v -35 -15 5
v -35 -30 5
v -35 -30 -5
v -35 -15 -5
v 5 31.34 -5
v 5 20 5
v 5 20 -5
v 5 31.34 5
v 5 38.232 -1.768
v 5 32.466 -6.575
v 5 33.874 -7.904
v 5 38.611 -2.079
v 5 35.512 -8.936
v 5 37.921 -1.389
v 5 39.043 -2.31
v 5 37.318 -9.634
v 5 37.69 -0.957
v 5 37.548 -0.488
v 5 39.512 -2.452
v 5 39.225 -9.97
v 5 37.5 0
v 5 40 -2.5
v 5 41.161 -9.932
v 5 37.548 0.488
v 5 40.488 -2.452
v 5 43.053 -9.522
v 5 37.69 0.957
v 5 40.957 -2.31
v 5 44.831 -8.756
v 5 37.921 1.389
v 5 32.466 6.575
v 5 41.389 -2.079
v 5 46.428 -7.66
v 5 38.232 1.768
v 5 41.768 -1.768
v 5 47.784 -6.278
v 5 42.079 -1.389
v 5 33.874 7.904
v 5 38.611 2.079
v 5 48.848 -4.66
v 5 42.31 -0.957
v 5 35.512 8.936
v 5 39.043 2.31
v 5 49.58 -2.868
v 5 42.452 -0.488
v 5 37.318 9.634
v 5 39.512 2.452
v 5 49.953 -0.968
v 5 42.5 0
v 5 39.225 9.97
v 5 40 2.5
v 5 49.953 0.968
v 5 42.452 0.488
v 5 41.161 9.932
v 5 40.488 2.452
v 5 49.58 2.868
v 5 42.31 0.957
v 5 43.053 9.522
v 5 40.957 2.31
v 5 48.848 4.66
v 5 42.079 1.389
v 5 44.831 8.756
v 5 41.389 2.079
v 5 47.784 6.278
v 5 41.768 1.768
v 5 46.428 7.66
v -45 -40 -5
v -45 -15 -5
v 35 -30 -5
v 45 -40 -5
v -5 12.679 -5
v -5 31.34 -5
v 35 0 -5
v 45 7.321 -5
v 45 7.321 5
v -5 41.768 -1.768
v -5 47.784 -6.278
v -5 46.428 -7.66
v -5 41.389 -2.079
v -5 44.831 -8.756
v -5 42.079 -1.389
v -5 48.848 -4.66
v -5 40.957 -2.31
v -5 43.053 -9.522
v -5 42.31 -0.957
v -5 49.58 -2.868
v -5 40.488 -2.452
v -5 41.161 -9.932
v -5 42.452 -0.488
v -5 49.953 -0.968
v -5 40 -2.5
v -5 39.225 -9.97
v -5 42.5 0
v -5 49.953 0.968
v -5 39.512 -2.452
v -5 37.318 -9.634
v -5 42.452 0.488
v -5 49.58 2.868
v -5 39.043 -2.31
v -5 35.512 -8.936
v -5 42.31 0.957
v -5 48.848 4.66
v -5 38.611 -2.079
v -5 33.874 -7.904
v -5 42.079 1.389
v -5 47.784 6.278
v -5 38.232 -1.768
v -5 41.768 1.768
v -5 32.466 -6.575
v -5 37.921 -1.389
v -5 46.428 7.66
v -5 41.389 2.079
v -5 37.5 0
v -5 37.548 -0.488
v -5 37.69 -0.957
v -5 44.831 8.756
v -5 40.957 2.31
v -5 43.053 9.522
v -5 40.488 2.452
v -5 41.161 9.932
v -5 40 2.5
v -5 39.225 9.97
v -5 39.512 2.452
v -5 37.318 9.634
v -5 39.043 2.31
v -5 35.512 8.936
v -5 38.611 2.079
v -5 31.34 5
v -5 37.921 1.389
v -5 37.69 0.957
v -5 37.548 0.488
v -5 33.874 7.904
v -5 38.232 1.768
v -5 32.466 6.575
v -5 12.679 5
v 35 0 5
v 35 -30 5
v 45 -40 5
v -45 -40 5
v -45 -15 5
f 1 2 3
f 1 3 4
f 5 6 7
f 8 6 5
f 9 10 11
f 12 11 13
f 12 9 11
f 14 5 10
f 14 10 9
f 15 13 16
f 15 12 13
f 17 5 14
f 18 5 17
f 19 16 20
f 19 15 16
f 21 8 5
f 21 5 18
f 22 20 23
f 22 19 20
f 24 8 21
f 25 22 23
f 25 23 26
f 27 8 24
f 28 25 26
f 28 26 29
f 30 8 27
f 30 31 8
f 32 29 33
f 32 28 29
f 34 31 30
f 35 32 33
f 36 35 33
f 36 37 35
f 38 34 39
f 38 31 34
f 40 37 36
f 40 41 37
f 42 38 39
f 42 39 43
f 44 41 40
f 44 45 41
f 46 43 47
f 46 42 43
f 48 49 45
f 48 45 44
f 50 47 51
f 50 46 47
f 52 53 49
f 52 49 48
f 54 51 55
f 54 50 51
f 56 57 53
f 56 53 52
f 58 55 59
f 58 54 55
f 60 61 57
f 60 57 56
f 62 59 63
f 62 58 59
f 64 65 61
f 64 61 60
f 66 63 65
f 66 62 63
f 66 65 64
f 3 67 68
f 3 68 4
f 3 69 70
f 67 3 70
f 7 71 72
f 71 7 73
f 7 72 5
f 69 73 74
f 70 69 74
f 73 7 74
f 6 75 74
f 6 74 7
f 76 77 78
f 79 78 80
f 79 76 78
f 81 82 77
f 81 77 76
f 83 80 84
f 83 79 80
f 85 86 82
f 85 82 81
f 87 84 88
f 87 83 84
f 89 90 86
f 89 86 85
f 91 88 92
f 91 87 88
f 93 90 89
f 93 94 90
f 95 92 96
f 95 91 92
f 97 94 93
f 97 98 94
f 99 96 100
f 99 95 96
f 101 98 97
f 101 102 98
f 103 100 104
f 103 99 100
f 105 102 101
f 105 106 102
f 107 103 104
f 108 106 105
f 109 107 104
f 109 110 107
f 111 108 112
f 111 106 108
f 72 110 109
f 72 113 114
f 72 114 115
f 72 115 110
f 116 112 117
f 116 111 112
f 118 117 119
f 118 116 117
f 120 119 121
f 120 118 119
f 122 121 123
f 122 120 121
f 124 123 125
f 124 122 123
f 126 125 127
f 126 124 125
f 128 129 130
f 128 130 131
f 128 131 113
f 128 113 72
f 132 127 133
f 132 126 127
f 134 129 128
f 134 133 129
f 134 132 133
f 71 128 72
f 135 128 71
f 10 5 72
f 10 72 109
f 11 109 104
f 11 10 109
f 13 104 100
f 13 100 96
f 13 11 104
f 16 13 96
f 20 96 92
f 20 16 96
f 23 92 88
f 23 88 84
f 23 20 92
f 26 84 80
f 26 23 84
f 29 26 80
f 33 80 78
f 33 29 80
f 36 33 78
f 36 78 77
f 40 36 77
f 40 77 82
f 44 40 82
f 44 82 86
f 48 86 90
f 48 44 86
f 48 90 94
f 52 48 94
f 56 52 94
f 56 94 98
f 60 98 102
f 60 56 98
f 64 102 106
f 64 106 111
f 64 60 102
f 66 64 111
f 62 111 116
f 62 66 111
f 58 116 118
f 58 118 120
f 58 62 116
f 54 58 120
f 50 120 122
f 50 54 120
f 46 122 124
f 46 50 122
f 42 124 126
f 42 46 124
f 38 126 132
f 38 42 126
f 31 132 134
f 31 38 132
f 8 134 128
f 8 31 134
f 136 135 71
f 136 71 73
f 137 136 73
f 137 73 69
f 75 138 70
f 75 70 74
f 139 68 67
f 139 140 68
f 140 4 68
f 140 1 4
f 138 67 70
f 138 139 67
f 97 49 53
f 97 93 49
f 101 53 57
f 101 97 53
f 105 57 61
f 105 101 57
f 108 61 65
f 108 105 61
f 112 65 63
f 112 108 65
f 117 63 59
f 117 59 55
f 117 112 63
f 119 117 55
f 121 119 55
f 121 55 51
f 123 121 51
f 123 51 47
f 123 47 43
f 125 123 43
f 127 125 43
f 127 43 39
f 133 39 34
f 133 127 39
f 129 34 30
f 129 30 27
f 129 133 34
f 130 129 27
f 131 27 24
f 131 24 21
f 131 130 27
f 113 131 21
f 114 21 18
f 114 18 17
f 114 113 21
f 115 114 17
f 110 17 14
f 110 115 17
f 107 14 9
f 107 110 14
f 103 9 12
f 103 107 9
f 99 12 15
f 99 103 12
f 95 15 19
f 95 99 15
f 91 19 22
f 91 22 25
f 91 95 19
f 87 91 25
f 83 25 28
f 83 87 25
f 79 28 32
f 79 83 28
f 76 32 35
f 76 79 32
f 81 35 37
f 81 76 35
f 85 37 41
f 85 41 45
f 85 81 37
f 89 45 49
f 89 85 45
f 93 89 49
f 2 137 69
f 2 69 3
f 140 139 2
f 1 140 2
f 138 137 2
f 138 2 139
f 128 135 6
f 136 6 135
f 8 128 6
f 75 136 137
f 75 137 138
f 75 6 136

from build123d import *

# Parameters (mm, degrees)
F1_DEPTH = 5
F2_R     = 2.5
F3_DEPTH = 5


with BuildPart() as f1:
    # F0 (on Top) → F1 (new body, symmetric)
    with BuildSketch(Plane.XY):
        Polygon((-45, -40), (0, -40), (45, -40), (45, 0), (45, 7.320508), (5, 20), (5, 31.33975), (-5, 31.33975), (-5, 12.679492), (35, 0), (35, -30), (-35, -30), (-35, -15), (-45, -15), align=None)
    extrude(amount=F1_DEPTH, both=True)

    # F2 (on Right) → F3 (join, symmetric)
    with BuildSketch(Plane.YZ):
        with BuildLine():
            Line((31.339746, 5), (31.339746, -5))
            ThreePointArc((31.339746, -5), (50, 0), (31.339746, 5))
        make_face()
        with Locations((40, 0)):
            Circle(F2_R, mode=Mode.SUBTRACT)
    extrude(amount=F3_DEPTH, both=True)


solid = f1.part
